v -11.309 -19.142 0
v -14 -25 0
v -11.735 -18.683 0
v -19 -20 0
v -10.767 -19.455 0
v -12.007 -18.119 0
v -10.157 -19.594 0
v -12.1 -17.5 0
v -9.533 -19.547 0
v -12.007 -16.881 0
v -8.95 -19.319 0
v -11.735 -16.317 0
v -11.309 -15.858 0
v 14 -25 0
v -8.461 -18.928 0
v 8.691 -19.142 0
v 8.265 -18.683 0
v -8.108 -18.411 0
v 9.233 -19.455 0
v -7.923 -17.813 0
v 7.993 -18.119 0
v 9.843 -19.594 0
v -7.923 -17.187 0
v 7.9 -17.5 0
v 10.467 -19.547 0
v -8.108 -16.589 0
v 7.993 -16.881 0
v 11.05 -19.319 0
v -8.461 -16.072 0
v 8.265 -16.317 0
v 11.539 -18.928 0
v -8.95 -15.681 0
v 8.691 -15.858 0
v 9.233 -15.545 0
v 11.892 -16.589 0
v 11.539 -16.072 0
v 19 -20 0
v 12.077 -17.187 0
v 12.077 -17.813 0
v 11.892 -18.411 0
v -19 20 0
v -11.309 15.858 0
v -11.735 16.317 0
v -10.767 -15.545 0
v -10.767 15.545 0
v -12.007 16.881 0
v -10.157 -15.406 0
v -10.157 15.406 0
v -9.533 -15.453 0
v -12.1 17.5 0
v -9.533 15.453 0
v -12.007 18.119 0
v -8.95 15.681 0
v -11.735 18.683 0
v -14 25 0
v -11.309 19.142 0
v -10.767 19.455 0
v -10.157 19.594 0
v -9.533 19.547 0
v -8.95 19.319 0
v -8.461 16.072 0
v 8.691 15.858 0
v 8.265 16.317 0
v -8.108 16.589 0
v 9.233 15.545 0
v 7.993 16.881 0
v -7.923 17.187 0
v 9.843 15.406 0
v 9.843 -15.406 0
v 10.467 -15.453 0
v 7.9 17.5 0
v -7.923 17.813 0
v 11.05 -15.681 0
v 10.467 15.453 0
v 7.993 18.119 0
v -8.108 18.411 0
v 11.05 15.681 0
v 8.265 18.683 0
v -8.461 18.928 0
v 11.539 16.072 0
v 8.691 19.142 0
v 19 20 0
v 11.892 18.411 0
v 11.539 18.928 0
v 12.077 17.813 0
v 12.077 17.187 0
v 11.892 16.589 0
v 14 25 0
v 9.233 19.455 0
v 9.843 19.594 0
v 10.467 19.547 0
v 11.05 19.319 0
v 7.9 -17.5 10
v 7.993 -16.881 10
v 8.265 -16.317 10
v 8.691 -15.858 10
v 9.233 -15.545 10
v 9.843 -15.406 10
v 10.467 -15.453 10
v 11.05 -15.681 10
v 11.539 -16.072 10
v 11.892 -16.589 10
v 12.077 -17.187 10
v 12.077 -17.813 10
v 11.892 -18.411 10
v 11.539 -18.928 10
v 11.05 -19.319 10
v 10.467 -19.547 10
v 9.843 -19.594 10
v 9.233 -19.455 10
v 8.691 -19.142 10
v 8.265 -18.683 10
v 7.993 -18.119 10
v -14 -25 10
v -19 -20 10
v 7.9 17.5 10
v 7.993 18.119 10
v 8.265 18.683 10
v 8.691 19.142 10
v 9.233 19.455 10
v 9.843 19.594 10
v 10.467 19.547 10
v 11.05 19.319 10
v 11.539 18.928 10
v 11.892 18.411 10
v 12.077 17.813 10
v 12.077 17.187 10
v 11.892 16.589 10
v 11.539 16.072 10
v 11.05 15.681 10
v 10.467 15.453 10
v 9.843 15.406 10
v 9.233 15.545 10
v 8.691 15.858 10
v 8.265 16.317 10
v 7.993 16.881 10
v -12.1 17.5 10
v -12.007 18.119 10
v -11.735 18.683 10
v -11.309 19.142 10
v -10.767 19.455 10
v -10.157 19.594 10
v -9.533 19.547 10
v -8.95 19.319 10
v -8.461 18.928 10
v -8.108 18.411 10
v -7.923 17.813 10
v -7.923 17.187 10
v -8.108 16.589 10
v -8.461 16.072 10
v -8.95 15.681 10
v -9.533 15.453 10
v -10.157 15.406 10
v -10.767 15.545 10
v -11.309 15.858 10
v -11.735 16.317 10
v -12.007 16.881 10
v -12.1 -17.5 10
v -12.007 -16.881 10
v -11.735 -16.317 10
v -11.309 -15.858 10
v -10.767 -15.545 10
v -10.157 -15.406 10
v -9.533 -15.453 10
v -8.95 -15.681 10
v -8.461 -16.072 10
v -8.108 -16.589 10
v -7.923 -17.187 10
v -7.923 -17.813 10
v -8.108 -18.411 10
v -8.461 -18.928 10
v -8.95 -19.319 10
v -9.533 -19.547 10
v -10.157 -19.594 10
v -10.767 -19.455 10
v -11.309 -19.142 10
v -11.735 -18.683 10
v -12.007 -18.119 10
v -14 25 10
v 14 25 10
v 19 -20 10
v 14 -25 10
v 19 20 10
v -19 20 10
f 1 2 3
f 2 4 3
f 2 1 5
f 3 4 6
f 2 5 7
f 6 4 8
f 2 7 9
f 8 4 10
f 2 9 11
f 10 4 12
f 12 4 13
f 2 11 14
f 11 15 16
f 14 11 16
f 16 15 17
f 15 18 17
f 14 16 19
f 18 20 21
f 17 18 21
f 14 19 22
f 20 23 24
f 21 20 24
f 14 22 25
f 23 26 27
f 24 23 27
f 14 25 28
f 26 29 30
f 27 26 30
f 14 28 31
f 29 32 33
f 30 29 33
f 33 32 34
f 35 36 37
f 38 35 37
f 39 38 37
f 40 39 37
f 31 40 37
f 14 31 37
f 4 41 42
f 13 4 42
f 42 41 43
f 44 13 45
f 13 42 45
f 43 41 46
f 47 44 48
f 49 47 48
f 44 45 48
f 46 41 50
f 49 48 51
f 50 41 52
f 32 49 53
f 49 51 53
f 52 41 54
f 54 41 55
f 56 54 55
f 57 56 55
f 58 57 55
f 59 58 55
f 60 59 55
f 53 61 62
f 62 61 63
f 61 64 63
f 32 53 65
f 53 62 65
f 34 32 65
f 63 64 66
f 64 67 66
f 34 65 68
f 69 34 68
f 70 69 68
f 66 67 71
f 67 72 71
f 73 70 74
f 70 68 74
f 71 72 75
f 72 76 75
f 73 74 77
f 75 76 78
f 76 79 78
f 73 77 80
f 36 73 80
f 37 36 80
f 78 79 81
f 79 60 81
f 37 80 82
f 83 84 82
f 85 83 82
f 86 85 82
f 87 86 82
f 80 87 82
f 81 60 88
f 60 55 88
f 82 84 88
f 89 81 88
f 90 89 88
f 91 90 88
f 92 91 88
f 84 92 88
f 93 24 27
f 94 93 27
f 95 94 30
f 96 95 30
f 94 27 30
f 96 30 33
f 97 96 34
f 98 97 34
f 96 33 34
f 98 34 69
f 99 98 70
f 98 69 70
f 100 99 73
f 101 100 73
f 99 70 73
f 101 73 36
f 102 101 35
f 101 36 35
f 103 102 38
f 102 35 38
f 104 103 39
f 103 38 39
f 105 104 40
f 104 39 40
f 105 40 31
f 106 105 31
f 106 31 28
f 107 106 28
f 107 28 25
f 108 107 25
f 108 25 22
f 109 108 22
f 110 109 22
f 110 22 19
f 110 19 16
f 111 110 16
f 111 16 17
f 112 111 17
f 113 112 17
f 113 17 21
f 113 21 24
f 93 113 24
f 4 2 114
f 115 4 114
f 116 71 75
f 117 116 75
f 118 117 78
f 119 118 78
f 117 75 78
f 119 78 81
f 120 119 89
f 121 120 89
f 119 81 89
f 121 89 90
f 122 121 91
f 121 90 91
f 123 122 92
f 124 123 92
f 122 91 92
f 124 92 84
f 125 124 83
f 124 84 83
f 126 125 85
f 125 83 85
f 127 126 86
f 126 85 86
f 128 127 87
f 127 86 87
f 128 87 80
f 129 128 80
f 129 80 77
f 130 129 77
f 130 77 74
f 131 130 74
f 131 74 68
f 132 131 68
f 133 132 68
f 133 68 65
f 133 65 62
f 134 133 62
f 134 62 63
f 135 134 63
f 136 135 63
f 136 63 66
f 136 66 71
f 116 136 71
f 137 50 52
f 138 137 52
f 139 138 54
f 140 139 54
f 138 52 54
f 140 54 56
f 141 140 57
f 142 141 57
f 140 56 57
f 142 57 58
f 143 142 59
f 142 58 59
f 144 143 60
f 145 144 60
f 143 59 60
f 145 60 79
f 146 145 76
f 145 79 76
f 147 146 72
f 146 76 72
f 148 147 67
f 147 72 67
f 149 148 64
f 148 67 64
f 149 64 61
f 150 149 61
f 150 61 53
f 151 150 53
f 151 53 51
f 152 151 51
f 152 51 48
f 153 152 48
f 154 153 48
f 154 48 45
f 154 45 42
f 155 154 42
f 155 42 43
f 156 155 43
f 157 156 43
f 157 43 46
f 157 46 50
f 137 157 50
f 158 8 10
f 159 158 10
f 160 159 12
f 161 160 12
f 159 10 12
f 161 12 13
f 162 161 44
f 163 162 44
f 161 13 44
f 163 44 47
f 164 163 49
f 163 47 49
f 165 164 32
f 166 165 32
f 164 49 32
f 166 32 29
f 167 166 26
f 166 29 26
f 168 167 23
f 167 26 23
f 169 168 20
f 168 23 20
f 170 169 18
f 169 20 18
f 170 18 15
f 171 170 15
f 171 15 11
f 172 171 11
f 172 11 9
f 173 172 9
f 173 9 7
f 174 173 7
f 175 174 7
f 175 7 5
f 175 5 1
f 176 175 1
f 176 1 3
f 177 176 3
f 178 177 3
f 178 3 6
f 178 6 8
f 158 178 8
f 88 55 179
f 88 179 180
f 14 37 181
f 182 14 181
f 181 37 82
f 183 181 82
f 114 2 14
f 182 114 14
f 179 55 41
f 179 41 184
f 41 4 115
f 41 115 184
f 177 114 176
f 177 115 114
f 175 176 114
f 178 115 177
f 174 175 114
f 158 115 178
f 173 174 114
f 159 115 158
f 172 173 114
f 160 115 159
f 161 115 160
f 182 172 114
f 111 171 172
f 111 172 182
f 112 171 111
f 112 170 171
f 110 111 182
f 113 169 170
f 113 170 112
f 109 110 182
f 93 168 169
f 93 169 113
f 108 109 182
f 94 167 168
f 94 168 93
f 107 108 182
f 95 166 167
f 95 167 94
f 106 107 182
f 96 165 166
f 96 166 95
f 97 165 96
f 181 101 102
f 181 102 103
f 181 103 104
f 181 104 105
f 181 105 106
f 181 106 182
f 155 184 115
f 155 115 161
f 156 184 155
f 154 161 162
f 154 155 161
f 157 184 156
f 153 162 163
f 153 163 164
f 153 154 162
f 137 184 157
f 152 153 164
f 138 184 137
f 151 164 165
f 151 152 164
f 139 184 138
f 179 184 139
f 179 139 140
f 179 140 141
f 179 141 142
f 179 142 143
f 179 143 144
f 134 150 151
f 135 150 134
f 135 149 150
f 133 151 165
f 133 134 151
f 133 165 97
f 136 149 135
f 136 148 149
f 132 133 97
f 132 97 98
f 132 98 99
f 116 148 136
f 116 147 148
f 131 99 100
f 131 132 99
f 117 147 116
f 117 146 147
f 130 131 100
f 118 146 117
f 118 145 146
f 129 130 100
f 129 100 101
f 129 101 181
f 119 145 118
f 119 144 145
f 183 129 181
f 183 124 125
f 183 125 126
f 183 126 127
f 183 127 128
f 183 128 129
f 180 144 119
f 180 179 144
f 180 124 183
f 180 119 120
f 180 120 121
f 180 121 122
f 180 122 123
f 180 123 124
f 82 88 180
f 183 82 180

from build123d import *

# Parameters (mm, degrees)
SKETCH_1_W          = 38
SKETCH_1_H          = 50
EXTRUDE_1_DEPTH     = 10
CHAMFER_1_SIZE      = 5
CUT_EXTRUDE_1_REACH = 34.955
SKETCH_2_R          = 2.1


with BuildPart() as part:
    # 草圖1 → 填料-伸長1 (new body)
    with BuildSketch(Plane.XY):
        Rectangle(SKETCH_1_W, SKETCH_1_H)
    extrude(amount=EXTRUDE_1_DEPTH)

    # 導角1
    chamfer_1_edges = [part.edges().sort_by_distance(p)[0] for p in [
        (19, -25, 5),
        (-19, -25, 5),
        (-19, 25, 5),
        (19, 25, 5),
    ]]
    chamfer(chamfer_1_edges, length=CHAMFER_1_SIZE)

    # 草圖2 → 除料-伸長1 (cut, up to next)
    with BuildSketch(Plane(origin=(0, 0, 0), x_dir=(-1, 0, 0), z_dir=(0, 0, -1)), mode=Mode.PRIVATE) as cut_extrude_1_sk1:
        with Locations((-10, 17.5)):
            Circle(SKETCH_2_R)
    cut_extrude_1_tool1 = extrude(cut_extrude_1_sk1.sketch, amount=-CUT_EXTRUDE_1_REACH, mode=Mode.PRIVATE) & part.part
    # 草圖2 → 除料-伸長1 (cut, up to next)
    with BuildSketch(Plane(origin=(0, 0, 0), x_dir=(-1, 0, 0), z_dir=(0, 0, -1)), mode=Mode.PRIVATE) as cut_extrude_1_sk2:
        with Locations((10, 17.5)):
            Circle(SKETCH_2_R)
    cut_extrude_1_tool2 = extrude(cut_extrude_1_sk2.sketch, amount=-CUT_EXTRUDE_1_REACH, mode=Mode.PRIVATE) & part.part
    # 草圖2 → 除料-伸長1 (cut, up to next)
    with BuildSketch(Plane(origin=(0, 0, 0), x_dir=(-1, 0, 0), z_dir=(0, 0, -1)), mode=Mode.PRIVATE) as cut_extrude_1_sk3:
        with Locations((-10, -17.5)):
            Circle(SKETCH_2_R)
    cut_extrude_1_tool3 = extrude(cut_extrude_1_sk3.sketch, amount=-CUT_EXTRUDE_1_REACH, mode=Mode.PRIVATE) & part.part
    # 草圖2 → 除料-伸長1 (cut, up to next)
    with BuildSketch(Plane(origin=(0, 0, 0), x_dir=(-1, 0, 0), z_dir=(0, 0, -1)), mode=Mode.PRIVATE) as cut_extrude_1_sk4:
        with Locations((10, -17.5)):
            Circle(SKETCH_2_R)
    cut_extrude_1_tool4 = extrude(cut_extrude_1_sk4.sketch, amount=-CUT_EXTRUDE_1_REACH, mode=Mode.PRIVATE) & part.part
    add(cut_extrude_1_tool1.solids().sort_by_distance((10, 17.5, 0))[0], mode=Mode.SUBTRACT)
    add(cut_extrude_1_tool2.solids().sort_by_distance((-10, 17.5, 0))[0], mode=Mode.SUBTRACT)
    add(cut_extrude_1_tool3.solids().sort_by_distance((10, -17.5, 0))[0], mode=Mode.SUBTRACT)
    add(cut_extrude_1_tool4.solids().sort_by_distance((-10, -17.5, 0))[0], mode=Mode.SUBTRACT)


solid = part.part
